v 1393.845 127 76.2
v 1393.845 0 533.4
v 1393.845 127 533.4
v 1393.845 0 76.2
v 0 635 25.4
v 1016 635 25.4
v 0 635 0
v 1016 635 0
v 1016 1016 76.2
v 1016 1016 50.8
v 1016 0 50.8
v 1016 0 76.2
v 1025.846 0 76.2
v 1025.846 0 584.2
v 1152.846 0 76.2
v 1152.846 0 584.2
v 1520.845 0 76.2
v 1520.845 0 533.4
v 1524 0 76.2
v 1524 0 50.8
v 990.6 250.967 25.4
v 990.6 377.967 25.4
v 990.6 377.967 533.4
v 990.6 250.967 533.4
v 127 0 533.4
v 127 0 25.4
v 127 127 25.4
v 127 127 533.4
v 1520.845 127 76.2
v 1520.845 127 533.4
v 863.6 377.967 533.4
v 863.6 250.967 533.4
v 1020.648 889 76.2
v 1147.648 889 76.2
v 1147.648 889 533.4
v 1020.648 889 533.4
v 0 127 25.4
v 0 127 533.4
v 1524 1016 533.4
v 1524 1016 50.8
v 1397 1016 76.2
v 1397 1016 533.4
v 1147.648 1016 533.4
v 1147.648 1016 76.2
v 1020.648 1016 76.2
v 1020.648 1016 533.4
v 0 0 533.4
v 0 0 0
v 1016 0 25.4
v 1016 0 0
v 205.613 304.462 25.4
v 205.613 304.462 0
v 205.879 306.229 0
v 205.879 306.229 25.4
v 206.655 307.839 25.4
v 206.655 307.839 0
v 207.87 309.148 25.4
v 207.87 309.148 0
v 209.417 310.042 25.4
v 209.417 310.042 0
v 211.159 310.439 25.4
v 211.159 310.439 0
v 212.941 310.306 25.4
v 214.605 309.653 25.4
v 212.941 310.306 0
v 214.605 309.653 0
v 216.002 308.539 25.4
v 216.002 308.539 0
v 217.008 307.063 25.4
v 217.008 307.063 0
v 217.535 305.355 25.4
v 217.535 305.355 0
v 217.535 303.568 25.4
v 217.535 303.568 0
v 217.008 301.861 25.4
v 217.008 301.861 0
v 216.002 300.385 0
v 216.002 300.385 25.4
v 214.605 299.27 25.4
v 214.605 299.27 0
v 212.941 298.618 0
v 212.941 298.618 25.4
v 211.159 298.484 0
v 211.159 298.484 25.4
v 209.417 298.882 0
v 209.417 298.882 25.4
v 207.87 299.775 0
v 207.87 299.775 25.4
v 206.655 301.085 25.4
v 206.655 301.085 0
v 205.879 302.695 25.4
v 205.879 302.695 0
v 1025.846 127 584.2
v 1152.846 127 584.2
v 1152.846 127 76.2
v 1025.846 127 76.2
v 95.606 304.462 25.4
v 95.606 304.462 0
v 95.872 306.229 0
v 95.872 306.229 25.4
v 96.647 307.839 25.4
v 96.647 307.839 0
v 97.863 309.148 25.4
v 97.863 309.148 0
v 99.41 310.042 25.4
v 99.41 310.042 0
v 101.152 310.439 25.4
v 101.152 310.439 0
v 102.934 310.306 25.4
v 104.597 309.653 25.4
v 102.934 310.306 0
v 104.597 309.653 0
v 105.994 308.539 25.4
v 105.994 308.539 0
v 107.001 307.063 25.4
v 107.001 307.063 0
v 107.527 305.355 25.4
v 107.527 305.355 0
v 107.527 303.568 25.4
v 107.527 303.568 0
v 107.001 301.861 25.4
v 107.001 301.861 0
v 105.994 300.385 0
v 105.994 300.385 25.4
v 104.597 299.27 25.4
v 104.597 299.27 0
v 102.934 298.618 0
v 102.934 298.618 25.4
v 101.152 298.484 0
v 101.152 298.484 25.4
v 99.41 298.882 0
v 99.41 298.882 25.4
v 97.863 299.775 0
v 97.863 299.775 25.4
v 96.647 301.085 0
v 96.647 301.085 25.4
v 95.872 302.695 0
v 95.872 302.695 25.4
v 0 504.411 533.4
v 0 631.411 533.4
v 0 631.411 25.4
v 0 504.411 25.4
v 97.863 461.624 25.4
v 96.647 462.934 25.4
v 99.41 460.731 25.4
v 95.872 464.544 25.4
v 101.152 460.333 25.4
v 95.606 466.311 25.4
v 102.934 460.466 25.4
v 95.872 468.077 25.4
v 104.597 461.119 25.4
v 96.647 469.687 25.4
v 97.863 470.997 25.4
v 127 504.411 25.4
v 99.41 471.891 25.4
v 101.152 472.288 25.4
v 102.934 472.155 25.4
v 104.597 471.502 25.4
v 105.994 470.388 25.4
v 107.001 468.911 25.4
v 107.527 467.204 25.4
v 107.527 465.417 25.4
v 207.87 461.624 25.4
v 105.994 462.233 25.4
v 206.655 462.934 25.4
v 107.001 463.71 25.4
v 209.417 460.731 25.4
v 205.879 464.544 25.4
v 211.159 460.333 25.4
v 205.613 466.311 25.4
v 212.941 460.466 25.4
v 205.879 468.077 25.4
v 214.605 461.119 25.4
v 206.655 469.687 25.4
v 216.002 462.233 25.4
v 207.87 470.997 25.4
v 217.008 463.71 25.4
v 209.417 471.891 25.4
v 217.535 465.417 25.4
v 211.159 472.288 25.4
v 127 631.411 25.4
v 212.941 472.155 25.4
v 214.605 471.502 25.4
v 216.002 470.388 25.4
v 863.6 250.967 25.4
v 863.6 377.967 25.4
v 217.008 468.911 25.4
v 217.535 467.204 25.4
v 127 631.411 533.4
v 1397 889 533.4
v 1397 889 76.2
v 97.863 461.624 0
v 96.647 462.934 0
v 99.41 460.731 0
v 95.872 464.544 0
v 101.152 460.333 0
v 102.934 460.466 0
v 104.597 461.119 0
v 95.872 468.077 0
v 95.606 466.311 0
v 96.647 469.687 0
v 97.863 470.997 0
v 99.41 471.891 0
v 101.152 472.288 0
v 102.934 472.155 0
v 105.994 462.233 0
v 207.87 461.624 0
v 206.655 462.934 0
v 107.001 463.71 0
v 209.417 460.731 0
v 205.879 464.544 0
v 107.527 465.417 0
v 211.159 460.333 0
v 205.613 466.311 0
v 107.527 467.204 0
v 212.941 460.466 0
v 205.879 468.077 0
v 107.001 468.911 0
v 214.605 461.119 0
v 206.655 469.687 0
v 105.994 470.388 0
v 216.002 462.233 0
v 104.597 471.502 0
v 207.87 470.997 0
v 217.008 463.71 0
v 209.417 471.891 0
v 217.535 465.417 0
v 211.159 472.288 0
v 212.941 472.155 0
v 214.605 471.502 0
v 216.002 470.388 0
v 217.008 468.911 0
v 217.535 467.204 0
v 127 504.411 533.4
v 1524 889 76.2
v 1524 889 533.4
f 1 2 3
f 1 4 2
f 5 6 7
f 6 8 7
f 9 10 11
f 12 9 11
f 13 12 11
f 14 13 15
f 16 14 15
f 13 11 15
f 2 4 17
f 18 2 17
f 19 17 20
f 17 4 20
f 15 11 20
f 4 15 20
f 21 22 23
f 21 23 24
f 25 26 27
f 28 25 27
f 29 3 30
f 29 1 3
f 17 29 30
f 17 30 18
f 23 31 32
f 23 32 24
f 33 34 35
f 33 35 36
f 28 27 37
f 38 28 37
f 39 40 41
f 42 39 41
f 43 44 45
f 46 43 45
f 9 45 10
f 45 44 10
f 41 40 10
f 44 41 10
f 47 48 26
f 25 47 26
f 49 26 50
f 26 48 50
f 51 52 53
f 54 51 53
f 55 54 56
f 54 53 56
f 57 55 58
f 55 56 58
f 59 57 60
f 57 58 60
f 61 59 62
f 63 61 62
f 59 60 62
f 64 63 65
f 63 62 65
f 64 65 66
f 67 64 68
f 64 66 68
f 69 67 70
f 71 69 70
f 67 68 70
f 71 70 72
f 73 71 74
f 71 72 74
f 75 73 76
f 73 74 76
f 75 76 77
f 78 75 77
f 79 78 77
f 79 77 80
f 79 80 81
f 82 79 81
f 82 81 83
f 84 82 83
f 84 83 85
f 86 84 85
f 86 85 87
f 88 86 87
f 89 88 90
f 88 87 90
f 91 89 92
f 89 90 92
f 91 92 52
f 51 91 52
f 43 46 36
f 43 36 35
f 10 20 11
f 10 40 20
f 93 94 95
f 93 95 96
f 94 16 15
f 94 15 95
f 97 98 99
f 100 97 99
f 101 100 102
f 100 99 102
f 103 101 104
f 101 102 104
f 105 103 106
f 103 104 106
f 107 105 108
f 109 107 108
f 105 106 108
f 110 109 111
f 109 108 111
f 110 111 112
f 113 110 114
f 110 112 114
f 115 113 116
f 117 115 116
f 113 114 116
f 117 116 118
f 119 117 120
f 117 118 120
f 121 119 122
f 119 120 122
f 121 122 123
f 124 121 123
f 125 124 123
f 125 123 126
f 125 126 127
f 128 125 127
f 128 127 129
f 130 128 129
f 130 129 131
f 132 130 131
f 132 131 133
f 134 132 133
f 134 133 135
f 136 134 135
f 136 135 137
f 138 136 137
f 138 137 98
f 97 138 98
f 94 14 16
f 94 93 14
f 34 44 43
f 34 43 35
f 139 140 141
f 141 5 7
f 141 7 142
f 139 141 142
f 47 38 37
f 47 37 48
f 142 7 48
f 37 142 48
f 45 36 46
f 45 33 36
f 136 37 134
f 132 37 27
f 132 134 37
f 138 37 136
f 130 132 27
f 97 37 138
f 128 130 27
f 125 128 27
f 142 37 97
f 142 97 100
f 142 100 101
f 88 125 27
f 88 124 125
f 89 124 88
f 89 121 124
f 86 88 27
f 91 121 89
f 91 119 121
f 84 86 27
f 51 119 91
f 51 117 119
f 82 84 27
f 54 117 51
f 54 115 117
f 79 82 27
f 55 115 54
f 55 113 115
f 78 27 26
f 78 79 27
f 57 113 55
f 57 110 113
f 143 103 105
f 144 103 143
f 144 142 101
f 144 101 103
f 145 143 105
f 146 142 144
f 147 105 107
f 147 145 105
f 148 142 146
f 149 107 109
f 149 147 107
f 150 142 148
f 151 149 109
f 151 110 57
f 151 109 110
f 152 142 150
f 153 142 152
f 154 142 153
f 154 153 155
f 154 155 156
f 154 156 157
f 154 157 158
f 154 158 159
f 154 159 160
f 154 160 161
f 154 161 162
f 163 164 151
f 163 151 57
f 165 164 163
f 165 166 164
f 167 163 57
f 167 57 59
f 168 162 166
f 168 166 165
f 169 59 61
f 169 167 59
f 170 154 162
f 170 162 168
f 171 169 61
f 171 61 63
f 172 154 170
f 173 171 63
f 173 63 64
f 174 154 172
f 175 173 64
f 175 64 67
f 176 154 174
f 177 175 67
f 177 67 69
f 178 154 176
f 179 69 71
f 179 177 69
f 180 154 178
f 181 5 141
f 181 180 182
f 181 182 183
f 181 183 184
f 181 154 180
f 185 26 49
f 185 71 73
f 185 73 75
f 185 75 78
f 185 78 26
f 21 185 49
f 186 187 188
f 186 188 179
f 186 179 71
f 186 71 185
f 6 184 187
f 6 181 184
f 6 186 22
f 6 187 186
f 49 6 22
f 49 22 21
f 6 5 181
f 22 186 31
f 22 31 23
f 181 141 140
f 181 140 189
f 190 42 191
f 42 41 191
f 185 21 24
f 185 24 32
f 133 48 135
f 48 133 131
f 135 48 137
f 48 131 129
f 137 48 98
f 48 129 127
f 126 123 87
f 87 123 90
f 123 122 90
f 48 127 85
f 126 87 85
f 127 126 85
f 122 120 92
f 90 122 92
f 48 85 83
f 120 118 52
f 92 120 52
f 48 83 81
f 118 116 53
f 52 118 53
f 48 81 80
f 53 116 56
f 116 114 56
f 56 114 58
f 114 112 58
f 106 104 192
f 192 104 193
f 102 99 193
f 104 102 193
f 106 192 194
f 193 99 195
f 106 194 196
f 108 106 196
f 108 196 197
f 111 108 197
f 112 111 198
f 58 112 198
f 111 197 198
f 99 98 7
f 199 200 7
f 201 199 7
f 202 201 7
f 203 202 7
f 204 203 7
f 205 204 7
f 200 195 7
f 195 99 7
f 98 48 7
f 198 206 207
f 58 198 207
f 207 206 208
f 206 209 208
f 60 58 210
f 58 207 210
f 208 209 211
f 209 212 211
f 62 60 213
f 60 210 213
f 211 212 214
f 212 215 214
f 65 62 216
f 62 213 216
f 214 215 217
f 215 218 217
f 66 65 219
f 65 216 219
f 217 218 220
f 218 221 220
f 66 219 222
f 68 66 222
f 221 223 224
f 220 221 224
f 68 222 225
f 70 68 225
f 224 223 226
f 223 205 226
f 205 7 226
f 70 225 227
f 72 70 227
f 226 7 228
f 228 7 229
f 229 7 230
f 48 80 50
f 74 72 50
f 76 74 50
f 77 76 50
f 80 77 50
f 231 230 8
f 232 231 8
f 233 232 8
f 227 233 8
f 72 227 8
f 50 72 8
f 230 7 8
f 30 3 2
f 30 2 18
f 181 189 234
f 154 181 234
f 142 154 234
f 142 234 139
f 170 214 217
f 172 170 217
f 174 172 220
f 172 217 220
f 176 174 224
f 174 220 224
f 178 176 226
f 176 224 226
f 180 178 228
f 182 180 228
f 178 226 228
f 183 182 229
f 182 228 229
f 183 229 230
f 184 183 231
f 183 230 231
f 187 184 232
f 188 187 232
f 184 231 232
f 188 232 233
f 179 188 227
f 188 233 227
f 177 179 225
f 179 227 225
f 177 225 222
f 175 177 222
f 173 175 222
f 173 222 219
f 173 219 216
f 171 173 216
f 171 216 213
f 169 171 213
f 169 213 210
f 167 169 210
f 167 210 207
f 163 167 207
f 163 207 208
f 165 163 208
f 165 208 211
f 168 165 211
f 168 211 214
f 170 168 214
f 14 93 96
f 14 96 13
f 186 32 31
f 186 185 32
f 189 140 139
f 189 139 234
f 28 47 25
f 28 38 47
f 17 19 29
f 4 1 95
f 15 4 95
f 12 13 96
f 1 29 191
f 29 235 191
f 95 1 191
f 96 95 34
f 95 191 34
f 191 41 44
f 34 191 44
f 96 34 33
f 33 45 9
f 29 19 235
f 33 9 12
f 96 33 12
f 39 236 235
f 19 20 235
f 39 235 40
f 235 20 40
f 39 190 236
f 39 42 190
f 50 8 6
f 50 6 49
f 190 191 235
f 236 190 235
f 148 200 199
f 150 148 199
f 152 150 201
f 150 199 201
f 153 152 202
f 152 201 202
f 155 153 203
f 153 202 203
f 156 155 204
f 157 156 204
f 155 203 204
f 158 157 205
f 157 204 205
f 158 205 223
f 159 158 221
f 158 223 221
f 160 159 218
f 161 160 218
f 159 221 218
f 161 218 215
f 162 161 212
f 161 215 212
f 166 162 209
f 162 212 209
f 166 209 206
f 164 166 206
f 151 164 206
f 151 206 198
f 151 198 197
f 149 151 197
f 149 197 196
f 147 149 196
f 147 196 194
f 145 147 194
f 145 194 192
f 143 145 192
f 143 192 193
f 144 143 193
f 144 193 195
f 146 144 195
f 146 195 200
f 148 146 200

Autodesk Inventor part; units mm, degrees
ref_plane "YZ Plane" through (0, 0, 0) normal (1, 0, 0) x (0, 1, 0)
ref_plane "XZ Plane" through (0, 0, 0) normal (0, 1, 0) x (-1, 0, 0)
ref_plane "XY Plane" through (0, 0, 0) normal (0, 0, 1) x (1, 0, 0)
sketch "Sketch1" plane through (0, 0, 0) normal (0, 0, 1) x (1, 0, 0)
  line L0 (0, 0) -> (1524, 0)
  line L1 (1524, 0) -> (1524, 1016)
  line L2 (1524, 1016) -> (1016, 1016)
  line L3 (1016, 1016) -> (1016, 635)
  line L4 (1016, 635) -> (0, 635)
  line L5 (0, 635) -> (0, 0)
  dimension "d0" = 1524
  dimension "d1" = 1016
  dimension "d2" = 508
  dimension "d3" = 381
extrude "Extrusion1" add sketch "Sketch1" along normal blind 25.4
sketch "Sketch2" plane through (0, 0, 25.4) normal (0, 0, 1) x (1, 0, 0)
  line L0 (0, 631.4106) -> (127, 631.4106)
  line L1 (127, 631.4106) -> (127, 504.4106)
  line L2 (127, 504.4106) -> (0, 504.4106)
  line L3 (0, 504.4106) -> (0, 631.4106)
  line L4 (0, 635) -> (0, 0) projected
  line L5 (0, 0) -> (127, 0)
  line L6 (127, 0) -> (127, 127)
  line L7 (127, 127) -> (0, 127)
  line L8 (0, 127) -> (0, 0)
  line L9 (1520.8454, 0) -> (1393.8454, 0)
  line L10 (1393.8454, 0) -> (1393.8454, 127)
  line L11 (1393.8454, 127) -> (1520.8454, 127)
  line L12 (1520.8454, 127) -> (1520.8454, 0)
  line L13 (1524, 1016) -> (1016, 1016) projected
  line L14 (1524, 1016) -> (1397, 1016)
  line L15 (1397, 1016) -> (1397, 889)
  line L16 (1397, 889) -> (1524, 889)
  line L17 (1524, 889) -> (1524, 1016)
  line L18 (1020.6484, 1016) -> (1147.6484, 1016)
  line L19 (1147.6484, 1016) -> (1147.6484, 889)
  line L20 (1147.6484, 889) -> (1020.6484, 889)
  line L21 (1020.6484, 889) -> (1020.6484, 1016)
  dimension "d6" = 127
  dimension "d7" = 127
  dimension "d8" = 127
  dimension "d9" = 127
  dimension "d10" = 127
  dimension "d11" = 127
  dimension "d12" = 127
  dimension "d13" = 127
  dimension "d14" = 127
  dimension "d15" = 127
extrude "Extrusion2" add sketch "Sketch2" along normal blind 508
sketch "Sketch3" plane through (0, 0, 0) normal (0, 0, -1) x (-1, 0, 0)
  circle A0 centre (-101.6, 466.3106) radius 5.9944
  circle A1 centre (-101.6, 304.4618) radius 5.9944
  circle A2 centre (-211.6074, 304.4618) radius 5.9944
  circle A3 centre (-211.6074, 466.3106) radius 5.9944
  line L0 (-127, 504.4106) -> (0, 504.4106) projected
  line L1 (0, 635) -> (0, 0) projected
  dimension "d18" = 11.9888
  dimension "d19" = 11.9888
  dimension "d20" = 11.9888
  dimension "d21" = 11.9888
  dimension "d23" = 38.1
  dimension "d24" = 161.8488
  dimension "d25" = 110.0074
  dimension "d26" = 110.0074
  dimension "d27" = 101.6
extrude "Extrusion3" cut sketch "Sketch3" against normal blind 508
sketch "Sketch4" plane through (0, 0, 0) normal (0, 0, -1) x (-1, 0, 0)
  line L0 (-1016, 635) -> (0, 635) projected
  line L1 (-1016, 635) -> (-1016, 0)
  line L2 (-127, 0) -> (-1393.8454, 0) projected
  line L3 (0, 0) -> (-1524, 0) projected
  line L4 (-1016, 0) -> (-1524, 0)
  line L5 (-1524, 0) -> (-1524, 1016) projected
  line L6 (-1524, 0) -> (-1524, 1016)
  line L7 (-1524, 1016) -> (-1016, 1016)
  line L8 (-1016, 1016) -> (-1016, 635) projected
  line L9 (-1016, 1016) -> (-1016, 635)
extrude "Extrusion4" add sketch "Sketch4" against normal blind 76.2
sketch "Sketch5" plane through (0, 0, 0) normal (0, 0, -1) x (-1, 0, 0)
  line L0 (-1524, 889) -> (-1524, 1016) projected
  line L1 (-1016, 0) -> (-1524, 0)
  line L2 (-1524, 0) -> (-1524, 1016)
  line L3 (-1524, 1016) -> (-1016, 1016)
  line L4 (-1016, 1016) -> (-1016, 0)
  point P0 (0, 0)
extrude "Extrusion5" cut sketch "Sketch5" against normal blind 50.8
sketch "Sketch7" plane through (0, 0, 25.4) normal (0, 0, 1) x (1, 0, 0)
  line L0 (863.6, 377.9671) -> (990.6, 377.9671)
  line L1 (990.6, 377.9671) -> (990.6, 250.9671)
  line L2 (990.6, 250.9671) -> (863.6, 250.9671)
  line L3 (863.6, 250.9671) -> (863.6, 377.9671)
  line L4 (0, 504.4106) -> (0, 127) projected
  point P0 (0, 0)
  dimension "d40" = 127
  dimension "d41" = 127
  dimension "d42" = 863.6
extrude "Extrusion6" add sketch "Sketch7" along normal blind 508
sketch "Sketch8" plane through (0, 0, 76.2) normal (0, 0, 1) x (1, 0, 0)
  line L0 (1025.8462, 0) -> (1152.8462, 0)
  line L1 (1152.8462, 0) -> (1152.8462, 127)
  line L2 (1152.8462, 127) -> (1025.8462, 127)
  line L3 (1025.8462, 127) -> (1025.8462, 0)
  point P0 (0, 0)
  dimension "d45" = 127
  dimension "d46" = 127
extrude "Extrusion7" add sketch "Sketch8" along normal blind 508
properties part number "Estructura de soporte"
